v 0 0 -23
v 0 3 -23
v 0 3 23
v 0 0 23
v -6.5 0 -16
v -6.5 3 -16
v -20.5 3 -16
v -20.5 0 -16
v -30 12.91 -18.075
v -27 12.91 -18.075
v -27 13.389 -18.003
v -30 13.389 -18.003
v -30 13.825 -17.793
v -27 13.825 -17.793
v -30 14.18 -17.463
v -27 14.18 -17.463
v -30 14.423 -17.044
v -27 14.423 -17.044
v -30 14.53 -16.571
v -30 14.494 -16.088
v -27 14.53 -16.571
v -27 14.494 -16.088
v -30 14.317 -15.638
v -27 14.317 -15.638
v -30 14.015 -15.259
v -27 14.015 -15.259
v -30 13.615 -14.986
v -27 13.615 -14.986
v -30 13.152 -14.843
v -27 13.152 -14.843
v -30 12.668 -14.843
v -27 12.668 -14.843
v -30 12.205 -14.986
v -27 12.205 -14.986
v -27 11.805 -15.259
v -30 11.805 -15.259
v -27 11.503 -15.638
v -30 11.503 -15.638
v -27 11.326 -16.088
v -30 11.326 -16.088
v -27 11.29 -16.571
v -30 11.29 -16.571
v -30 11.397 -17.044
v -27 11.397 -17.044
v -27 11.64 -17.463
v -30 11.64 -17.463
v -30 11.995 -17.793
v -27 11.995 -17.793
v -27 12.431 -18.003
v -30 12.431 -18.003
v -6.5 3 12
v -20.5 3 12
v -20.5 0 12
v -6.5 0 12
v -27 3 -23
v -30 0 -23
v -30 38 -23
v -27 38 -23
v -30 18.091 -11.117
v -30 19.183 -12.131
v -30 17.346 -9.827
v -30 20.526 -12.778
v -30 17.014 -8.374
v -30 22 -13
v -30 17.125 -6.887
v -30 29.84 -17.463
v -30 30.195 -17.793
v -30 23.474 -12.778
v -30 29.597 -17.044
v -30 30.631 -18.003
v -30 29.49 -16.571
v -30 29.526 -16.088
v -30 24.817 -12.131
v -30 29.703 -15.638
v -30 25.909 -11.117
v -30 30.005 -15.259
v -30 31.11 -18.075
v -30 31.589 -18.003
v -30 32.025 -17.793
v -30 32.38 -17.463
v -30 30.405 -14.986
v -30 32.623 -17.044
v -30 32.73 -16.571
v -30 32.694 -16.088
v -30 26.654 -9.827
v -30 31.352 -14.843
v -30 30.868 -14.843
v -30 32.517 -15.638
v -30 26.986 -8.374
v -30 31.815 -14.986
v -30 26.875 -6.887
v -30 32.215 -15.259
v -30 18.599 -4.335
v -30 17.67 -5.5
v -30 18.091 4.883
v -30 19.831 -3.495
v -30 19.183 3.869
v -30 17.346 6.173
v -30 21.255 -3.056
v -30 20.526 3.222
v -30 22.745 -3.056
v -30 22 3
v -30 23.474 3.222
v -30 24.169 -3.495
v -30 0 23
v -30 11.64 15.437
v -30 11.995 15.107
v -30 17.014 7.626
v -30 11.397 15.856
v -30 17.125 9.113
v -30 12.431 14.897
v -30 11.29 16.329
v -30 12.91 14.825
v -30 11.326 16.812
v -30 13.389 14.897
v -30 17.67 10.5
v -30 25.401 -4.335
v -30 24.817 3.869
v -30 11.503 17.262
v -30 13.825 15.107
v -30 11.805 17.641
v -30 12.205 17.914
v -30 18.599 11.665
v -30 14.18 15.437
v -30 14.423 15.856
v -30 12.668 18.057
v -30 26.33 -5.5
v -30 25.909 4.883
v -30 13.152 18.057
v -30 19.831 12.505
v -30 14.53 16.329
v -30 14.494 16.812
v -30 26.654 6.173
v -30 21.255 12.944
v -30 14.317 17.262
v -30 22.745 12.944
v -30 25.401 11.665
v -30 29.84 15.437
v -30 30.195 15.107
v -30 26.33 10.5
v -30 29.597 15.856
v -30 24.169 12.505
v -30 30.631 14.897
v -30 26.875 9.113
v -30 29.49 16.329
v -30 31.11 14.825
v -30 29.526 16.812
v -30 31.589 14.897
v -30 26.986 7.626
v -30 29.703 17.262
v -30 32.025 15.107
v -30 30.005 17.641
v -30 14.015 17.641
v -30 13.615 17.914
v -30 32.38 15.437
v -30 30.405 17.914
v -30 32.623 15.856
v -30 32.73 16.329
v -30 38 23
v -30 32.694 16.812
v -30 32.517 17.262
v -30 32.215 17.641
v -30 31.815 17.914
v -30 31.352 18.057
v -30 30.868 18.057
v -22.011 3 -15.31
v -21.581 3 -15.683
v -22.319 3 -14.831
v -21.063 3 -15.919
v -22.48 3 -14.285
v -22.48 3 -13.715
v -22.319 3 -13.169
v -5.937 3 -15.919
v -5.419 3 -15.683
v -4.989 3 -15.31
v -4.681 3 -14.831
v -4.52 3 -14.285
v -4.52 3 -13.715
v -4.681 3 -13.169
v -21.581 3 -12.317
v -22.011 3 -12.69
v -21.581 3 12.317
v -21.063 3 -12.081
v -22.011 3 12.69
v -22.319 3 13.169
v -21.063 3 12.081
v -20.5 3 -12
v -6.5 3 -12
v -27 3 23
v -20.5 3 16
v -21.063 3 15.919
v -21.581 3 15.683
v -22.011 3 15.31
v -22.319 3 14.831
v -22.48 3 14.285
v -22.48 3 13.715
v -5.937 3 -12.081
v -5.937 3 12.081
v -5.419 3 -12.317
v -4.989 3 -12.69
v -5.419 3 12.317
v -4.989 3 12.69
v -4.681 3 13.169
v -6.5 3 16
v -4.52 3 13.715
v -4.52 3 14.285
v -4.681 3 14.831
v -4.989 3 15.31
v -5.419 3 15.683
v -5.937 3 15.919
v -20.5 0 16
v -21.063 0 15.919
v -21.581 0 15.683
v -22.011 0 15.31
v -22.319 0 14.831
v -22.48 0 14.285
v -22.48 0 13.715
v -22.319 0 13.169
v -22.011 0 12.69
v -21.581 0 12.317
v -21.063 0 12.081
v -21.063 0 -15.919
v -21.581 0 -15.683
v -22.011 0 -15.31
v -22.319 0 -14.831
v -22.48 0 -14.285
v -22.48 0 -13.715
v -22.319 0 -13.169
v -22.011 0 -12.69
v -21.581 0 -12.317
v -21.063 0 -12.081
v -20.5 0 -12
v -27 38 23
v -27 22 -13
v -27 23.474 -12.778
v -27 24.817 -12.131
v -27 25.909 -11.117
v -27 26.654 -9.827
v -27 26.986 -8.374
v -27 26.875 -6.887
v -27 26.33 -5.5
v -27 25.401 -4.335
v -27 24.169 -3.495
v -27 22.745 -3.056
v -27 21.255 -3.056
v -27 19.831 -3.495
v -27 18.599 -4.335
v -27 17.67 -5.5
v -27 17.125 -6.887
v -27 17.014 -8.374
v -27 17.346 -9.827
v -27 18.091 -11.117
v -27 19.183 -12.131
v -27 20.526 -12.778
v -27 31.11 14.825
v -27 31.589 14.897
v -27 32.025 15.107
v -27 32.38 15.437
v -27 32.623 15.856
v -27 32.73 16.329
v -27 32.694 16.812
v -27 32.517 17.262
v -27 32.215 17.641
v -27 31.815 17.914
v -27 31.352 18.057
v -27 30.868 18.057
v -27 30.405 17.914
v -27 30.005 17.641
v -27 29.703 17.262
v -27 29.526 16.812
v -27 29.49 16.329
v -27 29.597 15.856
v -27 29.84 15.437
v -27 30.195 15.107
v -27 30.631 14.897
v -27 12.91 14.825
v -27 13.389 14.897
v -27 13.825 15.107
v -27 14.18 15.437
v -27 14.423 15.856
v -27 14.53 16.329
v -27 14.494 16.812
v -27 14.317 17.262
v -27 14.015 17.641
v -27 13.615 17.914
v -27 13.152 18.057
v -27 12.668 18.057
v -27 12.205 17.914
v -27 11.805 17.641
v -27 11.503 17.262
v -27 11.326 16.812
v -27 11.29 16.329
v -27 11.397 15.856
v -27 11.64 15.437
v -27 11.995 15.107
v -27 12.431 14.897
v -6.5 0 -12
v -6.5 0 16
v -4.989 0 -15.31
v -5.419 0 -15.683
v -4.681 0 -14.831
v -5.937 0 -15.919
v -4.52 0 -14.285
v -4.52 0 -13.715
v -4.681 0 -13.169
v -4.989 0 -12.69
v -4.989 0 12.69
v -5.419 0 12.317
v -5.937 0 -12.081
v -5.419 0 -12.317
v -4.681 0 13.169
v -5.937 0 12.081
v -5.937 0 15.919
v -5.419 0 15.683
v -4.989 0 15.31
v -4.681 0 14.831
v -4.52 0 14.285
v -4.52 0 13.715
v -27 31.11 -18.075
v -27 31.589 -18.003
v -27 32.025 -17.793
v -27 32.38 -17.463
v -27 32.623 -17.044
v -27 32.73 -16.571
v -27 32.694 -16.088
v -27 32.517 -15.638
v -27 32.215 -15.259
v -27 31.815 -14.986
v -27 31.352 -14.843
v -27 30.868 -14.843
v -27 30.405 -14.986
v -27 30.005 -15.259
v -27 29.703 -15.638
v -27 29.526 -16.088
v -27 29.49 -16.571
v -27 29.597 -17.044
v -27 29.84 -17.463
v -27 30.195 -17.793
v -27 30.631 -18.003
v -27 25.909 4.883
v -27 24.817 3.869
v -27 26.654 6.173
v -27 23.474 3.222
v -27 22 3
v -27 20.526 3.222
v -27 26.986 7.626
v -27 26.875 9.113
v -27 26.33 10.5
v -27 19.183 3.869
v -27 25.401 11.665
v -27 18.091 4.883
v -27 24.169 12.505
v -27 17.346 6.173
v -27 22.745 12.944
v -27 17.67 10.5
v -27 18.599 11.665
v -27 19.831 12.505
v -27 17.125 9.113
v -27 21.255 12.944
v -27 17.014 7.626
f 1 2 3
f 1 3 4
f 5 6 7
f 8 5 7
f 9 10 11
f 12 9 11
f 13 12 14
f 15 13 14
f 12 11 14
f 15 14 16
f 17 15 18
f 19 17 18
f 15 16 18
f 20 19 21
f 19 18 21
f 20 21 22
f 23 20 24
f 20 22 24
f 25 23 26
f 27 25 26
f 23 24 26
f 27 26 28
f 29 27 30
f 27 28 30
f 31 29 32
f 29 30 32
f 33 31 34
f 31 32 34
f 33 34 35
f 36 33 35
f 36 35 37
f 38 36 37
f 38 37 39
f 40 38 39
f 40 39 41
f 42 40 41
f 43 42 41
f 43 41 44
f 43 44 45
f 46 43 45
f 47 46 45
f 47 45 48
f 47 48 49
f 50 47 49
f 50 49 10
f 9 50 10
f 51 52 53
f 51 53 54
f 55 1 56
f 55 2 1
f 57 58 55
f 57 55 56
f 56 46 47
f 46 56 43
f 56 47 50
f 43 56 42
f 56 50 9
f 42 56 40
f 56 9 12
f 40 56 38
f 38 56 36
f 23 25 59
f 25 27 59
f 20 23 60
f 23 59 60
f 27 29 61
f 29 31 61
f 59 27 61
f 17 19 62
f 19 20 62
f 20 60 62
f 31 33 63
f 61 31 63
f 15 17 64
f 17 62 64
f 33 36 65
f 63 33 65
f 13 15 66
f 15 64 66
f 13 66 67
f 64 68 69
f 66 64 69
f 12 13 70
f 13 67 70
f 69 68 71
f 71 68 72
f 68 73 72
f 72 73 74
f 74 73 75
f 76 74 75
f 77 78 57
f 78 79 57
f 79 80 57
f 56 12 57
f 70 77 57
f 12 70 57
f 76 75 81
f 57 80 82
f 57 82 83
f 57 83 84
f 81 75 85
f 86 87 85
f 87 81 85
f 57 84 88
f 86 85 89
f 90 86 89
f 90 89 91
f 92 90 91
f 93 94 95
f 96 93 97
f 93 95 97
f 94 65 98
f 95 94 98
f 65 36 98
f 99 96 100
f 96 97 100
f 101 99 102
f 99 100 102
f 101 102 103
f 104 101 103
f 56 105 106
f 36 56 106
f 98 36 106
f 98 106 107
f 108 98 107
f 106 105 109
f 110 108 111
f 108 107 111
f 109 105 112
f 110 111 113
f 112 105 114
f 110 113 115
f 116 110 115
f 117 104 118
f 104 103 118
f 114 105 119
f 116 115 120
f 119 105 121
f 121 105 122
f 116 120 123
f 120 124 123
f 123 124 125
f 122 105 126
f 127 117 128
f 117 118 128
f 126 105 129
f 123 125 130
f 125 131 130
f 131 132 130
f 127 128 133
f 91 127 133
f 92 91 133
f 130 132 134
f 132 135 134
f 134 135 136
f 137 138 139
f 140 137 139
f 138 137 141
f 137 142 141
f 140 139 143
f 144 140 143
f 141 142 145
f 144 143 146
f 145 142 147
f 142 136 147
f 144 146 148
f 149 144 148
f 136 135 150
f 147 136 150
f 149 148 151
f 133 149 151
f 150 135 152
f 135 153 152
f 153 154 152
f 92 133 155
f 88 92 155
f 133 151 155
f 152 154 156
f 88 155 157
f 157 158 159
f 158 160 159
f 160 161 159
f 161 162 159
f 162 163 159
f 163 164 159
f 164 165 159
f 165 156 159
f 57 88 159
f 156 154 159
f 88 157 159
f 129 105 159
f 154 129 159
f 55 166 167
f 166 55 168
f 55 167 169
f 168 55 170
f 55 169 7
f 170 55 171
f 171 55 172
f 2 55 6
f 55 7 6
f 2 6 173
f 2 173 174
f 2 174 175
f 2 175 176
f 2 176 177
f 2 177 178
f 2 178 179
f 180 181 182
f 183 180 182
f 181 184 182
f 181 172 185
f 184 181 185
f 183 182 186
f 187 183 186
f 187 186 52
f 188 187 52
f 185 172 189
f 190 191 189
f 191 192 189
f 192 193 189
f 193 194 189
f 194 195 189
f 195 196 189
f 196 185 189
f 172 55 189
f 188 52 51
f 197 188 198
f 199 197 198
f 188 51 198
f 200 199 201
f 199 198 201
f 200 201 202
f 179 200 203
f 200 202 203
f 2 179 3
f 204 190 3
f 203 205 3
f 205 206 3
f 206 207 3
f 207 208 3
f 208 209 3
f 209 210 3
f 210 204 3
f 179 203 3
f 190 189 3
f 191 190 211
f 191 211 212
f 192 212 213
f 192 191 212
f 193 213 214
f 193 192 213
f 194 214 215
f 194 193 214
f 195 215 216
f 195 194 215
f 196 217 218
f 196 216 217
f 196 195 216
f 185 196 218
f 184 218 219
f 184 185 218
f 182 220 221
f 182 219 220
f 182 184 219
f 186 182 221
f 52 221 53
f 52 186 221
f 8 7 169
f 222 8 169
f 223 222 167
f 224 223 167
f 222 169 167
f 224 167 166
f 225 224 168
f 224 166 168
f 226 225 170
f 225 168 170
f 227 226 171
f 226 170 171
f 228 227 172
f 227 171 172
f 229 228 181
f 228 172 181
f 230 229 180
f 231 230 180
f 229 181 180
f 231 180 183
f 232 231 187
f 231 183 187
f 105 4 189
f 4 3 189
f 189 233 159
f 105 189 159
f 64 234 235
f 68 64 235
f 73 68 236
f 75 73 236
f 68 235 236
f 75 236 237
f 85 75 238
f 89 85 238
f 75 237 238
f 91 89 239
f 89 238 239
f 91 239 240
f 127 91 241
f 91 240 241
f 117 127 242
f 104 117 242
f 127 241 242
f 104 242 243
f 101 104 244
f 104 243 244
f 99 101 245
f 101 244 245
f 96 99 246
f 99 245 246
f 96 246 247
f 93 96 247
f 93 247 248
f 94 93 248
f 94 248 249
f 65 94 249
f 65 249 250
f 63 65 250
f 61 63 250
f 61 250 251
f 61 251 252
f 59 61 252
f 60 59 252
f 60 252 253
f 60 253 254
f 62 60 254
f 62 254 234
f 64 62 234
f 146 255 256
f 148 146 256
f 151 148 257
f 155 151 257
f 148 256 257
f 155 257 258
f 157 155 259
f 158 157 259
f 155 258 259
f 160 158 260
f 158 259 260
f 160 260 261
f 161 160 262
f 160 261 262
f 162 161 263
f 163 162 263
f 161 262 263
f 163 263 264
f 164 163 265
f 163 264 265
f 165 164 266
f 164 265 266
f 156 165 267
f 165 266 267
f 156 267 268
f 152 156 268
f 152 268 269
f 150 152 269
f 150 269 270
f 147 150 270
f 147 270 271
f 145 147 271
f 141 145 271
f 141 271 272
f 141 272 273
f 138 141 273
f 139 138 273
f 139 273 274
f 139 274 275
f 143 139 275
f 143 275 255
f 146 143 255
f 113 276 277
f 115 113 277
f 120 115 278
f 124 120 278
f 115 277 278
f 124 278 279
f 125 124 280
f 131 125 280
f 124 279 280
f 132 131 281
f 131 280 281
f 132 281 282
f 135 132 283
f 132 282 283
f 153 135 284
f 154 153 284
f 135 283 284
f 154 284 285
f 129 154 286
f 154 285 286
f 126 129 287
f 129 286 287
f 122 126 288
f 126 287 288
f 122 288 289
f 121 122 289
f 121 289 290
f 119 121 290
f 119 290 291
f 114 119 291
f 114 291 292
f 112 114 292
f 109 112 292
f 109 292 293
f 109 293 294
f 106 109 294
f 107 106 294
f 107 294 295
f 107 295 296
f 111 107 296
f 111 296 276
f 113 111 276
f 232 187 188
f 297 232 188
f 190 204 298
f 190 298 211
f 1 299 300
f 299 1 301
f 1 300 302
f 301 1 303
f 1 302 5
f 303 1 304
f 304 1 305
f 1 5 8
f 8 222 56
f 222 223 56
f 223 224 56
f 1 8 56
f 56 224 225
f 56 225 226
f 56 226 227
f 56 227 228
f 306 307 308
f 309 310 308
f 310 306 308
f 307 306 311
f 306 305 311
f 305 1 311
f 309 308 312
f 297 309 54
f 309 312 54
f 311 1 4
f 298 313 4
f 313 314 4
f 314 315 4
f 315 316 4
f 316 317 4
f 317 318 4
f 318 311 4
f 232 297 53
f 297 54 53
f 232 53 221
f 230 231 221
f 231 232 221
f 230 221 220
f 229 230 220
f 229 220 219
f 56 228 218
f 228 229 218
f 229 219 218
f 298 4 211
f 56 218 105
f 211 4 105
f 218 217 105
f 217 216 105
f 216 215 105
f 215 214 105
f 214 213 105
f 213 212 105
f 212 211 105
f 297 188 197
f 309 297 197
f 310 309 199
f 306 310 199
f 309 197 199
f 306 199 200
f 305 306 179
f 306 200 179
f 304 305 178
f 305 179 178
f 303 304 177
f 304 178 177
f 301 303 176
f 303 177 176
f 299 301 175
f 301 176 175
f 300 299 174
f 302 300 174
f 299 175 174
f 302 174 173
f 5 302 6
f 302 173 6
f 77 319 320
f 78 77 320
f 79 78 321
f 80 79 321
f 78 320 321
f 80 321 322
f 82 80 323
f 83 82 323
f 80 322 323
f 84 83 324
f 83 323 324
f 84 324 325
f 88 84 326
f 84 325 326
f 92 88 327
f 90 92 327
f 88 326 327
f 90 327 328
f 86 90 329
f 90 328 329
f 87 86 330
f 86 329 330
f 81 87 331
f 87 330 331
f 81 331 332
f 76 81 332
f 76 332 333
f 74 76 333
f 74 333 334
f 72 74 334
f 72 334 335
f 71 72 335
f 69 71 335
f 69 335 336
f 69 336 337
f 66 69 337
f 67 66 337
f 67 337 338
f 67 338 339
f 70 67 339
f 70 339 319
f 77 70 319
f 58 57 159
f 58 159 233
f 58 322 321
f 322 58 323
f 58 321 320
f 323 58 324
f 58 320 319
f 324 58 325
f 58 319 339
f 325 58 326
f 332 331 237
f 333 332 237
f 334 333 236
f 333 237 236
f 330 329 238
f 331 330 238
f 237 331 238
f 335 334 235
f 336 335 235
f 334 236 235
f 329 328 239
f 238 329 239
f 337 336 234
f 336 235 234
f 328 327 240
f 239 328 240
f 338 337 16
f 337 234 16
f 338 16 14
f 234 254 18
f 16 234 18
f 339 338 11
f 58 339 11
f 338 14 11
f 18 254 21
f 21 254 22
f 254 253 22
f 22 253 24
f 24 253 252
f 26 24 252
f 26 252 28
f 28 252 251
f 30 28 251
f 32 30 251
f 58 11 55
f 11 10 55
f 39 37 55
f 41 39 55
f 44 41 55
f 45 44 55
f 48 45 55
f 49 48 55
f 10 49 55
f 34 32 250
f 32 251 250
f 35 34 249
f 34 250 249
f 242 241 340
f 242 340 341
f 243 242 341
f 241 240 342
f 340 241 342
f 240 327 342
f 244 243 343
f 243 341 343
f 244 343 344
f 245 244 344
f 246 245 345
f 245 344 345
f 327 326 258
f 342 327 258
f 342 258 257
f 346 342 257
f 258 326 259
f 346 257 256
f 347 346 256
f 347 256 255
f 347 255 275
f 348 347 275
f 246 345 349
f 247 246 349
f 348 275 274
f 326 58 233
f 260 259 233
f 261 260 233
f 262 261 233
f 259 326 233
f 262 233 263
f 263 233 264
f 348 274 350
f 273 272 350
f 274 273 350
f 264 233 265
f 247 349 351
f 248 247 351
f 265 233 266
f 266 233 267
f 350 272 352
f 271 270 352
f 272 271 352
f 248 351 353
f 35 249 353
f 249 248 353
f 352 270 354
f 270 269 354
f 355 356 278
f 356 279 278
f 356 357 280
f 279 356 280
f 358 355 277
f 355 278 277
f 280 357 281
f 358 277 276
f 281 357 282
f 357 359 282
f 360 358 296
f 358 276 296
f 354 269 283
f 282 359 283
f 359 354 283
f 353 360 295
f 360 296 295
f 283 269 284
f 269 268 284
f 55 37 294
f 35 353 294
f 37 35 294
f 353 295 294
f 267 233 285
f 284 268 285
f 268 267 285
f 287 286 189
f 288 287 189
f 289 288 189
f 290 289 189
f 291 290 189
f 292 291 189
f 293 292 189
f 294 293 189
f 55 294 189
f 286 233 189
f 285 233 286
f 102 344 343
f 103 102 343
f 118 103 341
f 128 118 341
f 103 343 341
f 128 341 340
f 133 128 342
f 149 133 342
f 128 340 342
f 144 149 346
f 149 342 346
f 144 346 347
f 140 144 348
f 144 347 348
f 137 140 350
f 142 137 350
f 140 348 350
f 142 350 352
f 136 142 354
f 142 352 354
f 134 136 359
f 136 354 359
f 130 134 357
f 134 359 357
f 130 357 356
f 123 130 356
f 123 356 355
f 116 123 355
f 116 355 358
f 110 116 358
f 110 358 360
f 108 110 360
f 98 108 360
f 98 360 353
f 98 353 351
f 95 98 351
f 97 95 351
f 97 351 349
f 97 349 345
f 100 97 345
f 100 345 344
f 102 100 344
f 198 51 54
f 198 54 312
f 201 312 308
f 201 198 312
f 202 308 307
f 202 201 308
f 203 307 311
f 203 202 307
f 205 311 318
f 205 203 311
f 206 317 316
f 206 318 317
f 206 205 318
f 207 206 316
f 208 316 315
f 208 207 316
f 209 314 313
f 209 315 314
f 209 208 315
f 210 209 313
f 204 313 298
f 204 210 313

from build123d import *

# Parameters (mm, degrees)
BOSS_EXTRUDE1_DEPTH = 23
CUT_EXTRUDE1_DEPTH  = 52.51698749
SKETCH3_R           = 1.625
SKETCH3_R_2         = 5
CUT_EXTRUDE2_DEPTH  = 52.980765673


with BuildPart() as part:
    # Sketch1 → Boss-Extrude1 (new, symmetric)
    with BuildSketch(Plane.XY):
        Polygon((0, 0), (-30, 0), (-30, 38), (-27, 38), (-27, 3), (0, 3), align=None)
    extrude(amount=BOSS_EXTRUDE1_DEPTH, both=True)

    # Sketch2 → Cut-Extrude1 (cut, through all)
    with BuildSketch(Plane(origin=(0, 3, 0), x_dir=(1, 0, 0), z_dir=(0, 1, 0))):
        with BuildLine():
            Line((-6.5, -16), (-20.5, -16))
            ThreePointArc((-20.5, -16), (-22.5, -14), (-20.5, -12))
            Line((-20.5, -12), (-6.5, -12))
            ThreePointArc((-6.5, -12), (-4.5, -14), (-6.5, -16))
        make_face()
        with BuildLine():
            Line((-6.5, 16), (-20.5, 16))
            ThreePointArc((-20.5, 16), (-22.5, 14), (-20.5, 12))
            Line((-20.5, 12), (-6.5, 12))
            ThreePointArc((-6.5, 12), (-4.5, 14), (-6.5, 16))
        make_face()
    extrude(amount=-CUT_EXTRUDE1_DEPTH, mode=Mode.SUBTRACT)

    # Sketch3 → Cut-Extrude2 (cut, through all)
    with BuildSketch(Plane(origin=(-27, 0, 0), x_dir=(0, 0, -1), z_dir=(1, 0, 0))):
        with Locations((-16.45, 31.11)):
            Circle(SKETCH3_R)
        with Locations((-8, 22)):
            Circle(SKETCH3_R_2)
        with Locations((-16.45, 12.91)):
            Circle(SKETCH3_R)
        with Locations((8, 22)):
            Circle(SKETCH3_R_2)
        with Locations((16.45, 31.11)):
            Circle(SKETCH3_R)
        with Locations((16.45, 12.91)):
            Circle(SKETCH3_R)
    extrude(amount=-CUT_EXTRUDE2_DEPTH, mode=Mode.SUBTRACT)


solid = part.part
